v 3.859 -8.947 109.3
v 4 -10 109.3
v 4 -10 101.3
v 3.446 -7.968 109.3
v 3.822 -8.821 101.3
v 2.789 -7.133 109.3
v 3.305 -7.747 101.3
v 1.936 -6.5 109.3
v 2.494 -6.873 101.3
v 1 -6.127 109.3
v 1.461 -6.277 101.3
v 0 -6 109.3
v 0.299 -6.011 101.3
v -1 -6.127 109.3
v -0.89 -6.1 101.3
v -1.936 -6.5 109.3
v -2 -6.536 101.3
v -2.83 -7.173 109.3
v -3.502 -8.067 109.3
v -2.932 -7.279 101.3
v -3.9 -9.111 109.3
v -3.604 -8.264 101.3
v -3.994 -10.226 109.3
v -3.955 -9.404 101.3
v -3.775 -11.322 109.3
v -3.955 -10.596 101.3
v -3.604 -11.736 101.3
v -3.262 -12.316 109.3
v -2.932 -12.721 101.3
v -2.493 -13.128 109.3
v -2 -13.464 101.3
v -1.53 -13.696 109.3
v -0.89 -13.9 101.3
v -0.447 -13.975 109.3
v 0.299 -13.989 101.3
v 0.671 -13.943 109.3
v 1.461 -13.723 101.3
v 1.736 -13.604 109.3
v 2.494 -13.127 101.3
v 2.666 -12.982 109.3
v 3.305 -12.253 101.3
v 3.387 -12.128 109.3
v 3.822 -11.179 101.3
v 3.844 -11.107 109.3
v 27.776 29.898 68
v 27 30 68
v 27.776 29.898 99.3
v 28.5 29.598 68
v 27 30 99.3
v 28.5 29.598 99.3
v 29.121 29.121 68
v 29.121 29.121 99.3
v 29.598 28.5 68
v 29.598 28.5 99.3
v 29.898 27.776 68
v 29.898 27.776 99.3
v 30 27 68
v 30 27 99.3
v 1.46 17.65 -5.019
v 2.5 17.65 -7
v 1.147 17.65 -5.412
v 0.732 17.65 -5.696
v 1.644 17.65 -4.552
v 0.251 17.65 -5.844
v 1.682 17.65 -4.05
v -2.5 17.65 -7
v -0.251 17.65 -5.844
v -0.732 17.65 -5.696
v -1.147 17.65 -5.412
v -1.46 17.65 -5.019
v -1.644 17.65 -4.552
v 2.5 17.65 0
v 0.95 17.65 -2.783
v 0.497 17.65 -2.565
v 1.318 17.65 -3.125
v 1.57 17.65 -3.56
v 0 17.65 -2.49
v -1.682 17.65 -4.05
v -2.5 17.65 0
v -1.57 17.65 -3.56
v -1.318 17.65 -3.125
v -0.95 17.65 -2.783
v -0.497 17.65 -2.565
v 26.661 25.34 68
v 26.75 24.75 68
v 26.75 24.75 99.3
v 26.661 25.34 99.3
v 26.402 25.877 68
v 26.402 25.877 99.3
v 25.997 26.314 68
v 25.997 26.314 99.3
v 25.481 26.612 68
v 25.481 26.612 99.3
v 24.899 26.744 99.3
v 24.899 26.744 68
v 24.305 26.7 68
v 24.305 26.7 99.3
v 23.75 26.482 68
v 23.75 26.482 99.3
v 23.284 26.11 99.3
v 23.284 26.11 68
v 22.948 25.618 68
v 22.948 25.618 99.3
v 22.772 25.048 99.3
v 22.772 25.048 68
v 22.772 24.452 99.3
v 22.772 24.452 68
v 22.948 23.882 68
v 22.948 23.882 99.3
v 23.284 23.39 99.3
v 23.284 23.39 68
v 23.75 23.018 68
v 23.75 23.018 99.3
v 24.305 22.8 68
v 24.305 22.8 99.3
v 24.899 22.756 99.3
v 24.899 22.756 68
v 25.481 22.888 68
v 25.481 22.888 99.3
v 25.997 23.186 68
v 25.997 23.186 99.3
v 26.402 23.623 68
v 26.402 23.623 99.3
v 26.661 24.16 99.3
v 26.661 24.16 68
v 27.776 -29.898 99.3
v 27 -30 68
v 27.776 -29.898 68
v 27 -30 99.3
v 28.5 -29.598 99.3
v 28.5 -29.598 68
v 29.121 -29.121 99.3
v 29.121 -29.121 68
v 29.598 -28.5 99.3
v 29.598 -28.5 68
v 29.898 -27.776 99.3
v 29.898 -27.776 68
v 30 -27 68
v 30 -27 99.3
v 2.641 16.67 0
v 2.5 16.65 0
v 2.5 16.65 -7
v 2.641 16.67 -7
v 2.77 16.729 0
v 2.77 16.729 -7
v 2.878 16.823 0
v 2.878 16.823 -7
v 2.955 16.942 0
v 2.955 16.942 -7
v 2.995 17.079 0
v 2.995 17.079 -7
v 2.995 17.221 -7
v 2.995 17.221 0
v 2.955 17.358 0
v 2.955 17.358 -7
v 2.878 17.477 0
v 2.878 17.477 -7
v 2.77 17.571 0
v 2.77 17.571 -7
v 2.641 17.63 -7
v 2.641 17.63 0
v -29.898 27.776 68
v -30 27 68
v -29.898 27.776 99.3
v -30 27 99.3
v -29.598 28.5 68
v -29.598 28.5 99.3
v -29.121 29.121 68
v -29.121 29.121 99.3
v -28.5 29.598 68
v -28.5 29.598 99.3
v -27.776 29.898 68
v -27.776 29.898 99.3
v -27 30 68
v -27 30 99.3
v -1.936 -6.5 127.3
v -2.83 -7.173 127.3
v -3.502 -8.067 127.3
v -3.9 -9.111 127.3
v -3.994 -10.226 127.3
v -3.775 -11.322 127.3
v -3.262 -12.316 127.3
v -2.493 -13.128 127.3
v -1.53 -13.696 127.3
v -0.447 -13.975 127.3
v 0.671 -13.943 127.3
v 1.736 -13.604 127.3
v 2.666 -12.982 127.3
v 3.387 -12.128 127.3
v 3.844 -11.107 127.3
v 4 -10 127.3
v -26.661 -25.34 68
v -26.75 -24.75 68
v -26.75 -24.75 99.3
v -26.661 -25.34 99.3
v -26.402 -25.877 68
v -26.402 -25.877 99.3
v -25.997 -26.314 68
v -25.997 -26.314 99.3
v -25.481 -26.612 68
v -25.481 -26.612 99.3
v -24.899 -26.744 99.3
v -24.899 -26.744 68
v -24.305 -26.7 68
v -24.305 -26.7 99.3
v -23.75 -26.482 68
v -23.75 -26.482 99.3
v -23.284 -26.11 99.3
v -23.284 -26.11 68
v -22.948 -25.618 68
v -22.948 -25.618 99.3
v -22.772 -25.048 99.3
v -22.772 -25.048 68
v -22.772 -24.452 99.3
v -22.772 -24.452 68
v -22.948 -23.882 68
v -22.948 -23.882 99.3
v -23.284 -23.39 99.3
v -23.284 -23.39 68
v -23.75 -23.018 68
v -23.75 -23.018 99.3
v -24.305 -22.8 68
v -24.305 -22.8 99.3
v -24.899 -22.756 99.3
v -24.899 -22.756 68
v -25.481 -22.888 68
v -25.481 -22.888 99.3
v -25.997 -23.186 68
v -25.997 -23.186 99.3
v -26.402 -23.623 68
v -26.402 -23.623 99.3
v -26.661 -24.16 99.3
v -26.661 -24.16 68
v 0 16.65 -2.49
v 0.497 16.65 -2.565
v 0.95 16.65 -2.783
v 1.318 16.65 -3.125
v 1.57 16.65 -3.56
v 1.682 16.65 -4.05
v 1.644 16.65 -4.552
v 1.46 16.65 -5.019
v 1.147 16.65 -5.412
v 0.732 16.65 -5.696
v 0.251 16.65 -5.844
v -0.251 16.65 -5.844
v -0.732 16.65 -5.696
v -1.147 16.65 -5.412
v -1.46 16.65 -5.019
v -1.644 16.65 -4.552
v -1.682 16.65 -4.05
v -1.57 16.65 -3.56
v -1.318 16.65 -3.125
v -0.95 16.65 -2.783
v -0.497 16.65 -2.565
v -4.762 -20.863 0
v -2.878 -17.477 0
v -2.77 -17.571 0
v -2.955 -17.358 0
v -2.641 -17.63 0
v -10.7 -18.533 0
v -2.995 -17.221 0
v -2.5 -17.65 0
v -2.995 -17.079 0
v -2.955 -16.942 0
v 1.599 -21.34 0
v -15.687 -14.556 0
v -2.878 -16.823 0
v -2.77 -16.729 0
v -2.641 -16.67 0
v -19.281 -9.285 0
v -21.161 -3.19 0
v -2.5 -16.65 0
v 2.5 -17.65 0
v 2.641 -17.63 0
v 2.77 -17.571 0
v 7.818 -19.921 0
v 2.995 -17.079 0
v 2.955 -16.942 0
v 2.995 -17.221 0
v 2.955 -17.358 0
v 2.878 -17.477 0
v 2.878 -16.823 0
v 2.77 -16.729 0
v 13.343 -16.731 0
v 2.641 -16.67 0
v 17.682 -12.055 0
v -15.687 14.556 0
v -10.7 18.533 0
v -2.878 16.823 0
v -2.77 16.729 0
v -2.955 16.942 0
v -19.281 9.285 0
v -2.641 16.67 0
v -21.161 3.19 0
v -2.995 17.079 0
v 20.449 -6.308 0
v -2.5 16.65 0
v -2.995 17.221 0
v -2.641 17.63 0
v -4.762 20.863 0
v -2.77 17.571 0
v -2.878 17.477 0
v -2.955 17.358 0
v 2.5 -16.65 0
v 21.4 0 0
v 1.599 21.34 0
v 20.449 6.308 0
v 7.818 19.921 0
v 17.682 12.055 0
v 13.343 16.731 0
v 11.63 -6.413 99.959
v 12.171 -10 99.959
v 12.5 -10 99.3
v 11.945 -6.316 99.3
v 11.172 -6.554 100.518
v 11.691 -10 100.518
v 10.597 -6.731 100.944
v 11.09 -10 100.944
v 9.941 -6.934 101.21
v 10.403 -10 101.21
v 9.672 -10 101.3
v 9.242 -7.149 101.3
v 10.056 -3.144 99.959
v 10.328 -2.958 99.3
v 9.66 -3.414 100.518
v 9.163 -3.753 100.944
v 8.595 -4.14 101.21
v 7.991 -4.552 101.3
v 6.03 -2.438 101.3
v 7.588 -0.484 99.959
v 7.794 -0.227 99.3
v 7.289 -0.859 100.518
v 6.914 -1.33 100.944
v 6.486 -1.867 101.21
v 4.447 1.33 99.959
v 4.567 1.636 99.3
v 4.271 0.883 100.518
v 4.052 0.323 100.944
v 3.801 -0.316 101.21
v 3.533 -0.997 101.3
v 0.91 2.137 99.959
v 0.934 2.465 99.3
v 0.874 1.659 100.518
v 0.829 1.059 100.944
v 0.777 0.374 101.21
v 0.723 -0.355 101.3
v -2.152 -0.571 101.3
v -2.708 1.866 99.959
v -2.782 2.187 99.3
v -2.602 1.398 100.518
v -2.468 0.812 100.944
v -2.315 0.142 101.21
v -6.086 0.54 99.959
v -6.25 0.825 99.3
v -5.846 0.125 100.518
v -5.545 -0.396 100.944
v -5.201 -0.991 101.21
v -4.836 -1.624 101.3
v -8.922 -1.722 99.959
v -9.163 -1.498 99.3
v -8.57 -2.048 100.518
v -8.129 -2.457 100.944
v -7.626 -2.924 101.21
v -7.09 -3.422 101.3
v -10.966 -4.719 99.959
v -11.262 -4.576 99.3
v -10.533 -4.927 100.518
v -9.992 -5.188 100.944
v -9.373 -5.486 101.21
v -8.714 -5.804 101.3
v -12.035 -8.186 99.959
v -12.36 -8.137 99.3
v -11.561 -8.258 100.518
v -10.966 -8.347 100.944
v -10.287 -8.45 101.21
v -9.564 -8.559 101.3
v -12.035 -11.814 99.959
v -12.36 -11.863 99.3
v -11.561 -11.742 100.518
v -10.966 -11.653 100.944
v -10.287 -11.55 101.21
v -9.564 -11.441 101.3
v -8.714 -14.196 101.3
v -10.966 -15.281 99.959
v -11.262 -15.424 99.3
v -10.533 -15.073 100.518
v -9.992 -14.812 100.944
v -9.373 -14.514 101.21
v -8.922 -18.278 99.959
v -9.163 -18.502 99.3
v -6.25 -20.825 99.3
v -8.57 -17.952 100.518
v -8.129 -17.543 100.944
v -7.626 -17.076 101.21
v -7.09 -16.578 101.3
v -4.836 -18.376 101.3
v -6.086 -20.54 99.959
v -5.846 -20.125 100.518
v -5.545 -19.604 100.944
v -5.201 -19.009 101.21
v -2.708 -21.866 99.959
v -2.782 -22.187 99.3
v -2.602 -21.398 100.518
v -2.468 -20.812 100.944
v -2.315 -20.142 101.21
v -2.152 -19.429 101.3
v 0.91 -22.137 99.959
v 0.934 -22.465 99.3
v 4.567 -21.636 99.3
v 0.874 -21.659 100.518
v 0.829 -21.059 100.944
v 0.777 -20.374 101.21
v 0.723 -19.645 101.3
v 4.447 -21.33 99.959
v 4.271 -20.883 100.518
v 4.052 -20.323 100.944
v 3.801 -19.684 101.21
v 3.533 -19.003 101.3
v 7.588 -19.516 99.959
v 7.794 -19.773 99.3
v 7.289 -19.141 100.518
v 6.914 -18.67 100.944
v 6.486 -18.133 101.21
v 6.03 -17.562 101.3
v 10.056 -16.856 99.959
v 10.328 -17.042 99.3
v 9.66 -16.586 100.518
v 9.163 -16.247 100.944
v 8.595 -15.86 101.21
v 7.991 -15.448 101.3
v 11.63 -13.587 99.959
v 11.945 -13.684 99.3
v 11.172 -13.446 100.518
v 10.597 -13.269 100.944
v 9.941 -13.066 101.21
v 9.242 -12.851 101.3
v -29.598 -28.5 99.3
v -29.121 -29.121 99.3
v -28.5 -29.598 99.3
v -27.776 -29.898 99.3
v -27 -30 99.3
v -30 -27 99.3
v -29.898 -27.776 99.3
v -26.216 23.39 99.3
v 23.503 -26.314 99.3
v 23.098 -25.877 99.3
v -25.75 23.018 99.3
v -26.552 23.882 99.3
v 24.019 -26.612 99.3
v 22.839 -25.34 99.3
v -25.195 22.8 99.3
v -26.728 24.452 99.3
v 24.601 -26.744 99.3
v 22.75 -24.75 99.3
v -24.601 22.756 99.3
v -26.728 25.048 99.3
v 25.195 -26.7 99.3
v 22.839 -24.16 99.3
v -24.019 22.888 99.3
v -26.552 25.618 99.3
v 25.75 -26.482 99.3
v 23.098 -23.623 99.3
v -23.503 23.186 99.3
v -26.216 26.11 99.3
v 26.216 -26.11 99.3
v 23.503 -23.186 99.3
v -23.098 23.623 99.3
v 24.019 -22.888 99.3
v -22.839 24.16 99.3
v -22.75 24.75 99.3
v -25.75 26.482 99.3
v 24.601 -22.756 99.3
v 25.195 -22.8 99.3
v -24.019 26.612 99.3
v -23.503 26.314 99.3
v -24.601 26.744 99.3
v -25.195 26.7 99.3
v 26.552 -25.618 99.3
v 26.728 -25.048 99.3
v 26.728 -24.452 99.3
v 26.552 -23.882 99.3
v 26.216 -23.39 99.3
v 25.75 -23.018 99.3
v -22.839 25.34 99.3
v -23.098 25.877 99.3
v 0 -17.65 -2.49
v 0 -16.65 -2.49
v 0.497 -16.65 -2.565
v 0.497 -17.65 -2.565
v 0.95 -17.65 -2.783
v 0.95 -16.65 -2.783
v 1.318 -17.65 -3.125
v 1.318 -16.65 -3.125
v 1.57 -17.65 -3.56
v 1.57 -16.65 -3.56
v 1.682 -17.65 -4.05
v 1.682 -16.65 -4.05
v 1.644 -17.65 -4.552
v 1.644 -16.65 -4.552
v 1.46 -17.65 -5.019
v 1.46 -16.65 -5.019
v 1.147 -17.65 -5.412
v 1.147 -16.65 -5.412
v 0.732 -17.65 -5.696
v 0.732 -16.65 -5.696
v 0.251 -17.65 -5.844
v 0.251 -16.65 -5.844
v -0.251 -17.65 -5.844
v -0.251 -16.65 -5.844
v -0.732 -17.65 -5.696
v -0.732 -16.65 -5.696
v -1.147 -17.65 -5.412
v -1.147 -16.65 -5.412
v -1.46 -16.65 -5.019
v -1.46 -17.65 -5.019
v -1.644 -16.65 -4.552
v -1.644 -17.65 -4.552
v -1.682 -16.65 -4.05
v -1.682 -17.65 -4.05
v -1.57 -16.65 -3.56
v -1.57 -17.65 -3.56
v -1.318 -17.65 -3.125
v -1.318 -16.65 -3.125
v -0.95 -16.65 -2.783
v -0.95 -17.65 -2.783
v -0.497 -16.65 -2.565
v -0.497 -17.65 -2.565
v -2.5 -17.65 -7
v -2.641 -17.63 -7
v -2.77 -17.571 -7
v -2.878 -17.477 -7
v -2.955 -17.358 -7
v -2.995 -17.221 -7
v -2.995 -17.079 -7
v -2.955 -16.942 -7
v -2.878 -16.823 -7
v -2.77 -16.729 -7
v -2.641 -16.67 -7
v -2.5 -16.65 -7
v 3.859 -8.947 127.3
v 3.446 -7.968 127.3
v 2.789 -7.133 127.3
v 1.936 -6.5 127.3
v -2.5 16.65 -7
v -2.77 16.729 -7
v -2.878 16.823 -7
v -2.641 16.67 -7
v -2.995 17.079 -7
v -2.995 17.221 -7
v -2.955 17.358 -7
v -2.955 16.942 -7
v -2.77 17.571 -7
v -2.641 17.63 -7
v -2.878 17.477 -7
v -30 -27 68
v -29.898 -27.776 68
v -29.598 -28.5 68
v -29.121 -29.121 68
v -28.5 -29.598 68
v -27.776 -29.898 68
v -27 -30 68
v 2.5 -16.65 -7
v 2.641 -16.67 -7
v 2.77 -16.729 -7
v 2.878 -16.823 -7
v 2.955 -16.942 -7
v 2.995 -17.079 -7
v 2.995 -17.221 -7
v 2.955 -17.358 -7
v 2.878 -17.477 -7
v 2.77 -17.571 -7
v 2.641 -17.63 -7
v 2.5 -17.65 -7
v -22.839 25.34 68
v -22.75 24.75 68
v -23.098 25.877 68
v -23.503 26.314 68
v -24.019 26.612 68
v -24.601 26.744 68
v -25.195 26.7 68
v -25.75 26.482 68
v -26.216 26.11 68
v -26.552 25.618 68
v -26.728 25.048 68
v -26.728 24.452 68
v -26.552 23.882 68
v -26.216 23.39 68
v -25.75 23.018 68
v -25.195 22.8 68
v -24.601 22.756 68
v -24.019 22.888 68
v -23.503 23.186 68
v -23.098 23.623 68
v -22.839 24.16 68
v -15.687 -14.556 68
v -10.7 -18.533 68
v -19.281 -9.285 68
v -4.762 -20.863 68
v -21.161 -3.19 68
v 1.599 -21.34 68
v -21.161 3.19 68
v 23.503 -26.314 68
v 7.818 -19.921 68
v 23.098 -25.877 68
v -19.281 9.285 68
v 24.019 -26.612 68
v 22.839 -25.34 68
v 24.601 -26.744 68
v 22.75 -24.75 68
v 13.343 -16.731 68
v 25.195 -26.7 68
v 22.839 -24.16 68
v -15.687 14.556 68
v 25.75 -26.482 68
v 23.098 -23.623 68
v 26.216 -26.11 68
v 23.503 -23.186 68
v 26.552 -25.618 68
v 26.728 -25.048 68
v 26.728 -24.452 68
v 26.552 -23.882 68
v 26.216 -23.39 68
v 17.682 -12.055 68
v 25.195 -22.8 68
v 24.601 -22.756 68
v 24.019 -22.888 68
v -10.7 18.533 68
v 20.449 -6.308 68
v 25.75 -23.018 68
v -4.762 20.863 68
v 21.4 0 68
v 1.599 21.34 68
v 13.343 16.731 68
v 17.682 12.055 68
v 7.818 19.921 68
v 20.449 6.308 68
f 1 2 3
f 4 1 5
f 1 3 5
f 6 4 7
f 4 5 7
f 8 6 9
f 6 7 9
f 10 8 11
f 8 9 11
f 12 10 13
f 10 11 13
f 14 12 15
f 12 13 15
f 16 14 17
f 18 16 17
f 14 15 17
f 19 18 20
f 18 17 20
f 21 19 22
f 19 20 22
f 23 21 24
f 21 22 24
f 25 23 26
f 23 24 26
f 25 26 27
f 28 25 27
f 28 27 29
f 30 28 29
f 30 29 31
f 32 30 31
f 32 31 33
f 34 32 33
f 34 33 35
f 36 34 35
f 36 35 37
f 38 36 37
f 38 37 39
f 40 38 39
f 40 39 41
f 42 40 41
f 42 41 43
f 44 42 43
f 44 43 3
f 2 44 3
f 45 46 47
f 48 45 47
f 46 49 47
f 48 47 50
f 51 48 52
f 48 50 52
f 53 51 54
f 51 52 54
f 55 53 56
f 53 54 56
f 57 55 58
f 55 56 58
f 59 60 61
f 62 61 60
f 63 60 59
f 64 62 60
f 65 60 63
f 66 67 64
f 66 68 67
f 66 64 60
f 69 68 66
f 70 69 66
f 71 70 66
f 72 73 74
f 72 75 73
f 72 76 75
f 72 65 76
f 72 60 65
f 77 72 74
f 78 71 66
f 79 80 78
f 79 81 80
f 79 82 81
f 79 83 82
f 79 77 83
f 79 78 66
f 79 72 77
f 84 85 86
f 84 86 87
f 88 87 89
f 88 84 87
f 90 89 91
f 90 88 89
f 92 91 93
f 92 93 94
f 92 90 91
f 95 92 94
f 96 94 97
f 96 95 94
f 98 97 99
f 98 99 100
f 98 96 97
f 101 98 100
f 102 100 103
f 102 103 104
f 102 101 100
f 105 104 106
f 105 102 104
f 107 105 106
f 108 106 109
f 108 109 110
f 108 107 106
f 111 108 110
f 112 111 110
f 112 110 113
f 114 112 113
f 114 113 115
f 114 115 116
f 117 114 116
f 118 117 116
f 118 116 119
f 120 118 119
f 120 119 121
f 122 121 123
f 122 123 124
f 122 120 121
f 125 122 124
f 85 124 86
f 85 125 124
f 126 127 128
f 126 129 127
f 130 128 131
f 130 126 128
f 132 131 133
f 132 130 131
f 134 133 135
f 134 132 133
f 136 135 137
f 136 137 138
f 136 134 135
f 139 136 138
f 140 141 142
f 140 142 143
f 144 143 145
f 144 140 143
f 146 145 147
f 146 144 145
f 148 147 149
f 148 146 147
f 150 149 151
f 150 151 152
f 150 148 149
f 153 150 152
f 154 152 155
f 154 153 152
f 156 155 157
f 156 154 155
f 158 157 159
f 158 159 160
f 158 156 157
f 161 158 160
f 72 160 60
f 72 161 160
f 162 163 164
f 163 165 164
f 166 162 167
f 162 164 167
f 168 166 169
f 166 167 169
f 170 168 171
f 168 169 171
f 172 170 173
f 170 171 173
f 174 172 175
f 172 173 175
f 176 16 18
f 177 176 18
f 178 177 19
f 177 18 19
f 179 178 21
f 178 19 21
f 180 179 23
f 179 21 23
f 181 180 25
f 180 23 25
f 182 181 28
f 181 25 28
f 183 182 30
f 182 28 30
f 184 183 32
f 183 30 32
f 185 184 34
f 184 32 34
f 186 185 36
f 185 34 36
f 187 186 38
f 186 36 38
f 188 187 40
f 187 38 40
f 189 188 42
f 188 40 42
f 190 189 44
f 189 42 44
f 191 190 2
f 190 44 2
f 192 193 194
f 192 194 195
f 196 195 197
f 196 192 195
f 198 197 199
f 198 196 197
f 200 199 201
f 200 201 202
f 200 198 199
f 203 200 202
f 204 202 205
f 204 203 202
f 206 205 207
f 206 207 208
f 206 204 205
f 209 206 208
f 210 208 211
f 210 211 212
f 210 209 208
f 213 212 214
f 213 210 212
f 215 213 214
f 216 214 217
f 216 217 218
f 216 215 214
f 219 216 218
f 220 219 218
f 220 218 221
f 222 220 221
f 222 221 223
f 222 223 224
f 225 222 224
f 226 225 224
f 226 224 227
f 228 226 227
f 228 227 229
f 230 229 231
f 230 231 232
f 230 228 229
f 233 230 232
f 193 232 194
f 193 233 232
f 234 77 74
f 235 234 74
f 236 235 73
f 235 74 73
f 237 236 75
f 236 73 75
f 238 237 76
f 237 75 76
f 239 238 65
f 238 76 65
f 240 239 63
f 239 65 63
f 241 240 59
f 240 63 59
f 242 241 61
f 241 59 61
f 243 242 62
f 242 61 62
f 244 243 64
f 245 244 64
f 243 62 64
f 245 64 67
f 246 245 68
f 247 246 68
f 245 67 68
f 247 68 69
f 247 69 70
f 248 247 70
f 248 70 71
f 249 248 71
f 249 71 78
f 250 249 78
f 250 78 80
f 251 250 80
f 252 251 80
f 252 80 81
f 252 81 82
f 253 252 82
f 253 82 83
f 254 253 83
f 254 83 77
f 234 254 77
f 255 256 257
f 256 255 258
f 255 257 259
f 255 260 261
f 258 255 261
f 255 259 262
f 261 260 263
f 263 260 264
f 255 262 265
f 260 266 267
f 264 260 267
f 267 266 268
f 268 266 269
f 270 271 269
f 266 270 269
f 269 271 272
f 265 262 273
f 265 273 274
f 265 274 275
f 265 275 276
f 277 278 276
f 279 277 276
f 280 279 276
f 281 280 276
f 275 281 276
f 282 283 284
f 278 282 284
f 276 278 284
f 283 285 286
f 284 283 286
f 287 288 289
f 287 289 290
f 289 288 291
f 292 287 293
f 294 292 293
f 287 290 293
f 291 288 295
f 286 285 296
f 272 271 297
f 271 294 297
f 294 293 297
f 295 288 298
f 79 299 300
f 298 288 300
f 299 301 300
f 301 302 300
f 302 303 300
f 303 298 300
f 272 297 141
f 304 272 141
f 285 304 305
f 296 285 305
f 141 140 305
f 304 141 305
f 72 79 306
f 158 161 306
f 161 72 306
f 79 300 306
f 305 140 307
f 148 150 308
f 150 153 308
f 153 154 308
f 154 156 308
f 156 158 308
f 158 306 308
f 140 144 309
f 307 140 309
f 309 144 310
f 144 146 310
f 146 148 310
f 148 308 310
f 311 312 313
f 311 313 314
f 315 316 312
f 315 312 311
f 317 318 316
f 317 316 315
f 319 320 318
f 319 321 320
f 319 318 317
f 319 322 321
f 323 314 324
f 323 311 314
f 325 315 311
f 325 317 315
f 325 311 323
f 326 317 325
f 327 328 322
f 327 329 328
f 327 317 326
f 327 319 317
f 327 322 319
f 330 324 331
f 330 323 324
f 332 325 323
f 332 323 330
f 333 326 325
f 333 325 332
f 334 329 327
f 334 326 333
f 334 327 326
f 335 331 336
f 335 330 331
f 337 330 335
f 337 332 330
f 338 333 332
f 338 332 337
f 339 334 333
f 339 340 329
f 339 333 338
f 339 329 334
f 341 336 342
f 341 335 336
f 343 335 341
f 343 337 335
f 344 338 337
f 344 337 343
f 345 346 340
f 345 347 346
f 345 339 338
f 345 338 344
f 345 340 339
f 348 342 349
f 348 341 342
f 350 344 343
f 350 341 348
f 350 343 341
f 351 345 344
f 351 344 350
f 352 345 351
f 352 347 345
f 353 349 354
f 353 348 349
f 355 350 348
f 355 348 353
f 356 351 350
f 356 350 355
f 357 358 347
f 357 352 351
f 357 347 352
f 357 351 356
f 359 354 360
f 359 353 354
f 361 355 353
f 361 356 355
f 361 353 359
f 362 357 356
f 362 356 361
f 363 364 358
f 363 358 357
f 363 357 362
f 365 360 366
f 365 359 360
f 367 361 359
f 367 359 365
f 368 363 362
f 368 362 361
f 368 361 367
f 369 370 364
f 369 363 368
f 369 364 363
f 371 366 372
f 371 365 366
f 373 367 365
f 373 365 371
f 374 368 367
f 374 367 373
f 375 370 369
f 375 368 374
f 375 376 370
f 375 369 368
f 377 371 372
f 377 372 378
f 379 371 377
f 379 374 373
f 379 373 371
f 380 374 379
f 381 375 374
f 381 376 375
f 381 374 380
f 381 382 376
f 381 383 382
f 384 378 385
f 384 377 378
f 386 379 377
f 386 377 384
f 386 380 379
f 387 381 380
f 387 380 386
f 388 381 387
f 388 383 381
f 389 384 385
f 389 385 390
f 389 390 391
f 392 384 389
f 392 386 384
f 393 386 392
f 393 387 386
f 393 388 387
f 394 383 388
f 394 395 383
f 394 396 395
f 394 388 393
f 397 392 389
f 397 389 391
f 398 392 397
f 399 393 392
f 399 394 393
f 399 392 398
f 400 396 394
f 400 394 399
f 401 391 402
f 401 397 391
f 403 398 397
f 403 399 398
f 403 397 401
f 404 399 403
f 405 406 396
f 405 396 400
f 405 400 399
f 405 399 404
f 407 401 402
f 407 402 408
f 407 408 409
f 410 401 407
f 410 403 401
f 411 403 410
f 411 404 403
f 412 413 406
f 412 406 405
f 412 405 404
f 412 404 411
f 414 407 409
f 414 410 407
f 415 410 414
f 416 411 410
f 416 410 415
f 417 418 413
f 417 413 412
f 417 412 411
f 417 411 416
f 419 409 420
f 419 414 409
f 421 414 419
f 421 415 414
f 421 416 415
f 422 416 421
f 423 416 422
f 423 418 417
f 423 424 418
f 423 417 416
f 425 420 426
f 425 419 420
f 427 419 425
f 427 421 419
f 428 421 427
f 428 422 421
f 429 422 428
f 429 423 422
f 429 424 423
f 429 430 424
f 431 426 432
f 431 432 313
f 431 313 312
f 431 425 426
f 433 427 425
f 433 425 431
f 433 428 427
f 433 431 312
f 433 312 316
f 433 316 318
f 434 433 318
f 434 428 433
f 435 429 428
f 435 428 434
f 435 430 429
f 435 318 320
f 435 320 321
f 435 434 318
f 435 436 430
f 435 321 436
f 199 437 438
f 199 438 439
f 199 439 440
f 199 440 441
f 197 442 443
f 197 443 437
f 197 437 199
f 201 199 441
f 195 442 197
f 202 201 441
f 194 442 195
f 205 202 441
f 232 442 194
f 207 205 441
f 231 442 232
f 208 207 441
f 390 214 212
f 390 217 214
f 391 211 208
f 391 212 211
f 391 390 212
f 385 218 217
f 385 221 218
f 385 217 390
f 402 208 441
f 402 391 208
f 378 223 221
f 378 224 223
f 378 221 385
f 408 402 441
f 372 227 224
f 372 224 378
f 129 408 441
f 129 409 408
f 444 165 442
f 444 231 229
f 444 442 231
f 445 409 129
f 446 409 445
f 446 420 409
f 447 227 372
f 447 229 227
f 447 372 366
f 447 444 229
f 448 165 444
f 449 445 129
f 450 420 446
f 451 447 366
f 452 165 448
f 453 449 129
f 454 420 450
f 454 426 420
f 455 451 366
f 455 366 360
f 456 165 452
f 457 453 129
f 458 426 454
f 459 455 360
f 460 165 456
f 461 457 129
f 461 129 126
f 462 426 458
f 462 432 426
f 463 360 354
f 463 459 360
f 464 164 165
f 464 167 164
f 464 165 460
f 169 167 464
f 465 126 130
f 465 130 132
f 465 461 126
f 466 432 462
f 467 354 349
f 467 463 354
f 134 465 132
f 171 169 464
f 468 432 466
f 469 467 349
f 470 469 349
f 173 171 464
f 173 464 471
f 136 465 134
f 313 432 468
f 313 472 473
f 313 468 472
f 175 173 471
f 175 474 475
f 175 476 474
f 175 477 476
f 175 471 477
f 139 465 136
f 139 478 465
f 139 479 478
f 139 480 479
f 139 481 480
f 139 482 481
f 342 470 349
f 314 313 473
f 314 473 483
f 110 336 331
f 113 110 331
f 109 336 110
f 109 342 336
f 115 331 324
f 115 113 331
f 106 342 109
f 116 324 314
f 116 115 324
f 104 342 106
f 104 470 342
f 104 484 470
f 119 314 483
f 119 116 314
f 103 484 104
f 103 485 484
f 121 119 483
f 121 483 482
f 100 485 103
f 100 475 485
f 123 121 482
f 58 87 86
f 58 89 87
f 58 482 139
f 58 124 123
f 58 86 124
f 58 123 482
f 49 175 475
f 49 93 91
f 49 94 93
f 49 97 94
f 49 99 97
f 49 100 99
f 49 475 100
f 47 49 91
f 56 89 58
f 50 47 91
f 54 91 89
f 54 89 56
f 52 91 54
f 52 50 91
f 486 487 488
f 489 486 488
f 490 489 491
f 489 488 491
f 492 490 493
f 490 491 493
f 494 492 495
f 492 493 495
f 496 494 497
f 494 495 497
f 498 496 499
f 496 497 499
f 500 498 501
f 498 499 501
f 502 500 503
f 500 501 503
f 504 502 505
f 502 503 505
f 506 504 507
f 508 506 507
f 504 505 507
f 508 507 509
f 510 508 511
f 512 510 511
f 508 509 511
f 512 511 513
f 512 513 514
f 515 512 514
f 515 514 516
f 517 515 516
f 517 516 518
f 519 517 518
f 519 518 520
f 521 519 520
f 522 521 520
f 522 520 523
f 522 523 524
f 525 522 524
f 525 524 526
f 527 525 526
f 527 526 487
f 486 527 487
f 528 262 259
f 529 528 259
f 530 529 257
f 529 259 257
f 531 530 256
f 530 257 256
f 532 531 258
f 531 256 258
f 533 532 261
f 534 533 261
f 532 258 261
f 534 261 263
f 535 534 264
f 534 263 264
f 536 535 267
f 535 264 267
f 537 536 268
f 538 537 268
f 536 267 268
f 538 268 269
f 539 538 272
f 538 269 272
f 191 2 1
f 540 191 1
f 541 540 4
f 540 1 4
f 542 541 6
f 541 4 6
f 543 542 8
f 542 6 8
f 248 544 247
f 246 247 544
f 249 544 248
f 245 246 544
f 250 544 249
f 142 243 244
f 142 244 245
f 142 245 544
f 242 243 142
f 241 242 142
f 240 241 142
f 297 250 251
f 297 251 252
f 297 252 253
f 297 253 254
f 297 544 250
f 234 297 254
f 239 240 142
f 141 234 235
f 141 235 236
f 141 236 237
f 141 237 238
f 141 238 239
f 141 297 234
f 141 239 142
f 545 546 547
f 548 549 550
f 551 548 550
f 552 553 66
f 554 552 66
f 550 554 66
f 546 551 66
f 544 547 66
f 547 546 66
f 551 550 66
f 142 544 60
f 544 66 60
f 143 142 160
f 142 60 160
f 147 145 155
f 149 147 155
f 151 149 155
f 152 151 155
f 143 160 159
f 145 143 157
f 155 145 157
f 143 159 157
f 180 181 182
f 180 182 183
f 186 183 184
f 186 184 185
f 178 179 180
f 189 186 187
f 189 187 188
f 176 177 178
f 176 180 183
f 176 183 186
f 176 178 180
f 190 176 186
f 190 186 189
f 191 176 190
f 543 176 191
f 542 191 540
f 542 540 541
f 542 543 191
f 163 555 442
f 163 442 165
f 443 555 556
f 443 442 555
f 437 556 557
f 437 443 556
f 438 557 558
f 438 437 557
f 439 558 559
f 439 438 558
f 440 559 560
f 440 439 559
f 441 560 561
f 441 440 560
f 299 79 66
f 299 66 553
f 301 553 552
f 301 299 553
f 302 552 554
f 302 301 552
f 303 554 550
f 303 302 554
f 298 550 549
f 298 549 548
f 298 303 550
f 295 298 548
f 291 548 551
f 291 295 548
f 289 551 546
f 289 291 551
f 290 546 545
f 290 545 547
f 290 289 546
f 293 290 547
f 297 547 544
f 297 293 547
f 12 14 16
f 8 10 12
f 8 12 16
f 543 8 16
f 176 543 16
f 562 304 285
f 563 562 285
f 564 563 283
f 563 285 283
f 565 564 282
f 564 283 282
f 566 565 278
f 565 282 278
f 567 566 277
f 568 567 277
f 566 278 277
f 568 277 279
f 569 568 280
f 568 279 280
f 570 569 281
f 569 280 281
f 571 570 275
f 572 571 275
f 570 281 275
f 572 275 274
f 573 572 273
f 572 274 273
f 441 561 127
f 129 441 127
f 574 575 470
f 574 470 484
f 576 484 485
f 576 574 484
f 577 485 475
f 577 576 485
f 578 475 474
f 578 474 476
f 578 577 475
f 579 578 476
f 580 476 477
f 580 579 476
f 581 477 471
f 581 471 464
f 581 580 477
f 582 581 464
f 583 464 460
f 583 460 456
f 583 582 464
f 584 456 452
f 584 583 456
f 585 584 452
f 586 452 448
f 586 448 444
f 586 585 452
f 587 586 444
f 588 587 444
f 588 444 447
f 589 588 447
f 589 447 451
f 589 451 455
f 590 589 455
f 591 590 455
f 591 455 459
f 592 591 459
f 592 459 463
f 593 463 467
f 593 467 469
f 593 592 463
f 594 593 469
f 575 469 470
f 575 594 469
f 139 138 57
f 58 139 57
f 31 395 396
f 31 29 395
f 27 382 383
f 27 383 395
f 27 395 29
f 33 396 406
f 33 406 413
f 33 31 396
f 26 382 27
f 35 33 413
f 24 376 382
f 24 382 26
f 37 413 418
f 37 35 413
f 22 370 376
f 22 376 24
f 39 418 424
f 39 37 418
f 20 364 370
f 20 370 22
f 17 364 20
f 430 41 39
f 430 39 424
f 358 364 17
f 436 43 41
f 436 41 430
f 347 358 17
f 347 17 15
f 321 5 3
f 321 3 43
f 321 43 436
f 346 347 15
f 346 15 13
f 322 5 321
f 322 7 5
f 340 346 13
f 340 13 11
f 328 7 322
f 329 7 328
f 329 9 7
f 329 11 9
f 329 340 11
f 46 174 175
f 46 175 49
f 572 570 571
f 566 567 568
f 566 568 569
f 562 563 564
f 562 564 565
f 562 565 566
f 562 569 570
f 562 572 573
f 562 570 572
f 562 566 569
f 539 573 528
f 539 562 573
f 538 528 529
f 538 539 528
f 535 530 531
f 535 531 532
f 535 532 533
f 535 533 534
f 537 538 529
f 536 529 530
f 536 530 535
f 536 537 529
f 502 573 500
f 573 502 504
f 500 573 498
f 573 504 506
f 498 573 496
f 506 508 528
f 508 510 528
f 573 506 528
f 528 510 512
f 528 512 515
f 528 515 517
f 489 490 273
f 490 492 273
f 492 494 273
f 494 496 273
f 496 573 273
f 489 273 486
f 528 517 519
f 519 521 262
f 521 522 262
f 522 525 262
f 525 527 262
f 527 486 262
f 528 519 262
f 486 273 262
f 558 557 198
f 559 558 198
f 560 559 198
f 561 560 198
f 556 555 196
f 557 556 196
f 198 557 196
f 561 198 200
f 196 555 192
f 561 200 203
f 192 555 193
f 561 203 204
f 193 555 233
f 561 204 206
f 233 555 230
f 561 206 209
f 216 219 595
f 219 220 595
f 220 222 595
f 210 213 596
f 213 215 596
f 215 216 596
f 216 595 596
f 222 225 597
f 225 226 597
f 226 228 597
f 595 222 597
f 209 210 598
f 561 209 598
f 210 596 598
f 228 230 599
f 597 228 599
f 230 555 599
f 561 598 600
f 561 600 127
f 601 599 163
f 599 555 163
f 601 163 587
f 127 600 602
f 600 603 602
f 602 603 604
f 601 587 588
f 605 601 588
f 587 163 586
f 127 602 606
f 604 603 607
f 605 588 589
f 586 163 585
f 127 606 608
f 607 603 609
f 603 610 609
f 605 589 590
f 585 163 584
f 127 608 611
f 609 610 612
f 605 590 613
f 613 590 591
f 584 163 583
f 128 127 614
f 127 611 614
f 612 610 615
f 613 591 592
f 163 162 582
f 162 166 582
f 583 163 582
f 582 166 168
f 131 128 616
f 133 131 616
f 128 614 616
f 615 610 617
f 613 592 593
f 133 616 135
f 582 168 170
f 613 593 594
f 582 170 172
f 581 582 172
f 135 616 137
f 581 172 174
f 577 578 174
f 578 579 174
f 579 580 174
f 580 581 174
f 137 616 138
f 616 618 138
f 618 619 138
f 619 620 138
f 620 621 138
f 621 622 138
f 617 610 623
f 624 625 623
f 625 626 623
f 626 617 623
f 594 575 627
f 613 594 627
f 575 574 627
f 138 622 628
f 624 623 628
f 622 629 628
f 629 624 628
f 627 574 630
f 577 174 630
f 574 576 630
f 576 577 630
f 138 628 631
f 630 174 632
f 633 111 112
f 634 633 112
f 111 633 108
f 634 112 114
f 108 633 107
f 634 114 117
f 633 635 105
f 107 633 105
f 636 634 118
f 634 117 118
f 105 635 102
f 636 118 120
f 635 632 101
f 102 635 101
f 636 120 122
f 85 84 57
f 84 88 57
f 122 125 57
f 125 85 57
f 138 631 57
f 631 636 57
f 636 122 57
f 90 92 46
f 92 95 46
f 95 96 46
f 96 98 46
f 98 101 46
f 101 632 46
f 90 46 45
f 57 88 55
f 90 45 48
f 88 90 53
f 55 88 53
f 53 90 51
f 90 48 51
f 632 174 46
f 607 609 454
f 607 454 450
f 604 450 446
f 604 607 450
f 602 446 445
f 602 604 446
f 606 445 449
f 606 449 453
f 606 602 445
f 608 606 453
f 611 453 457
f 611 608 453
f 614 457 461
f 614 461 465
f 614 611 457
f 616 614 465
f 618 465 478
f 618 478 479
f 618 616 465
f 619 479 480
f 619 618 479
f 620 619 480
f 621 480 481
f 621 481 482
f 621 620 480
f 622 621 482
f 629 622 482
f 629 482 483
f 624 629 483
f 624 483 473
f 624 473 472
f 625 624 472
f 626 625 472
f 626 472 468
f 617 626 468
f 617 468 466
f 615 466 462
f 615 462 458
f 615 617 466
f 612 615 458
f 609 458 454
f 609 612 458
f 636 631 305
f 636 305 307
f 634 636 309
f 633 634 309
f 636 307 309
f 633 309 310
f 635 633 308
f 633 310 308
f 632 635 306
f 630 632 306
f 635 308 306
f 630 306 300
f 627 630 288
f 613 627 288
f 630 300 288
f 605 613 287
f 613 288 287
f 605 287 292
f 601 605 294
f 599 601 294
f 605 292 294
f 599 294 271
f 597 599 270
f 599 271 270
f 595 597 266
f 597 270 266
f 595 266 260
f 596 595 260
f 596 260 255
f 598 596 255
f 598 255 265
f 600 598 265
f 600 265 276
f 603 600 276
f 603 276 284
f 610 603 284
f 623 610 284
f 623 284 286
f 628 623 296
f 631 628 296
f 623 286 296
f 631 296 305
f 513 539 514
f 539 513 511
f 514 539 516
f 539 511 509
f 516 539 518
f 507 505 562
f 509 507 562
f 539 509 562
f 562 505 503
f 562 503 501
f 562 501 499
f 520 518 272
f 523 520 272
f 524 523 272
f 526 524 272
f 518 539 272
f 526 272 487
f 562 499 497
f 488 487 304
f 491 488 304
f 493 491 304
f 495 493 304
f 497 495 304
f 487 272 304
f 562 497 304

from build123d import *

# Parameters (mm, degrees)
SKETCH1_R           = 21.4
BOSS_EXTRUDE1_DEPTH = 68
SKETCH2_W           = 60
SKETCH2_H           = 60
SKETCH2_R           = 2
BOSS_EXTRUDE2_DEPTH = 31.3
SKETCH3_R           = 12.5
BOSS_EXTRUDE3_DEPTH = 2
FILLET1_R           = 3
SKETCH4_R           = 4
BOSS_EXTRUDE4_DEPTH = 8
BOSS_EXTRUDE5_DEPTH = 18
FILLET2_R           = 3
BOSS_EXTRUDE6_DEPTH = 7
CUT_EXTRUDE1_REACH  = 141.197
SKETCH7_R           = 1.686317599


with BuildPart() as part:
    # Sketch1 → Boss-Extrude1 (new body)
    with BuildSketch(Plane.XY):
        Circle(SKETCH1_R)
    extrude(amount=BOSS_EXTRUDE1_DEPTH)

    # Sketch2 → Boss-Extrude2 (add)
    with BuildSketch(Plane.XY.offset(68)):
        Rectangle(SKETCH2_W, SKETCH2_H)
        with Locations((-24.75, 24.75)):
            Circle(SKETCH2_R, mode=Mode.SUBTRACT)
        with Locations((24.75, 24.75)):
            Circle(SKETCH2_R, mode=Mode.SUBTRACT)
        with Locations(Location((24.75, -24.75, 0), (0, 0, 180))):
            Circle(SKETCH2_R, mode=Mode.SUBTRACT)
        with Locations(Location((-24.75, -24.75, 0), (0, 0, 180))):
            Circle(SKETCH2_R, mode=Mode.SUBTRACT)
    extrude(amount=BOSS_EXTRUDE2_DEPTH)

    # Sketch3 → Boss-Extrude3 (add)
    with BuildSketch(Plane.XY.offset(99.3)):
        with Locations((0, -10)):
            Circle(SKETCH3_R)
    extrude(amount=BOSS_EXTRUDE3_DEPTH)

    # Fillet1
    # the kernel refuses this fillet: 3 mm, written as the material it takes off along each edge
    with BuildSketch(Plane(origin=(0, -10, 101.3), x_dir=(1, 0, 0), z_dir=(0, -1, 0))) as fillet1_piece_1:
        with BuildLine():
            CenterArc((9.671572875, -3), FILLET1_R, 19.471220634, 70.528779366)
            Line((9.671572875, 0), (9.671572875, 0.06))
            Line((9.671572875, 0.06), (12.5, 0.06))
            Line((12.5, 0.06), (12.56, 0))
            ThreePointArc((12.56, 0), (12.56, -1), (12.556568542, -1.98))
            Line((12.556568542, -1.98), (12.5, -2))
        make_face()
    revolve(axis=Axis((0, -10, 101.3), (0, 0, 1)), mode=Mode.SUBTRACT)

    # Sketch4 → Boss-Extrude4 (add)
    with BuildSketch(Plane.XY.offset(101.3)):
        with Locations((0, -10)):
            Circle(SKETCH4_R)
    extrude(amount=BOSS_EXTRUDE4_DEPTH)

    # Sketch5 → Boss-Extrude5 (add)
    with BuildSketch(Plane.XY.offset(109.3)):
        with BuildLine():
            Line((1.936491673, -6.5), (-1.936491673, -6.5))
            ThreePointArc((-1.936491673, -6.5), (-2.031506006, -13.445719569), (4, -10))
            ThreePointArc((4, -10), (3.445719569, -7.968493994), (1.936491673, -6.5))
        make_face()
    extrude(amount=BOSS_EXTRUDE5_DEPTH)

    # Fillet2
    fillet2_edges = [part.edges().sort_by_distance(p)[0] for p in [
        (-30, -30, 83.65),
        (30, -30, 83.65),
        (30, 30, 83.65),
        (-30, 30, 83.65),
    ]]
    fillet(fillet2_edges, radius=FILLET2_R)

    # Sketch6 → Boss-Extrude6 (add)
    with BuildSketch(Plane(origin=(0, 0, 0), x_dir=(-1, 0, 0), z_dir=(0, 0, -1))):
        with BuildLine():
            Line((-2.5, 17.65), (2.5, 17.65))
            ThreePointArc((2.5, 17.65), (3, 17.15), (2.5, 16.65))
            Line((2.5, 16.65), (-2.5, 16.65))
            ThreePointArc((-2.5, 16.65), (-3, 17.15), (-2.5, 17.65))
        make_face()
        with BuildLine():
            Line((-2.5, -17.65), (2.5, -17.65))
            ThreePointArc((2.5, -17.65), (3, -17.15), (2.5, -16.65))
            Line((2.5, -16.65), (-2.5, -16.65))
            ThreePointArc((-2.5, -16.65), (-3, -17.15), (-2.5, -17.65))
        make_face()
    extrude(amount=BOSS_EXTRUDE6_DEPTH)

    # Cut-Extrude1: up to this face of the body (flat: up to its plane)
    cut_extrude1_end = Plane(part.part.faces().sort_by_distance((0, -17.65, -3.5))[0])
    # Sketch7 → Cut-Extrude1 (cut, up to the picked face)
    with BuildSketch(Plane(origin=(0, 17.65, 0), x_dir=(1, 0, 0), z_dir=(0, 1, 0)), mode=Mode.PRIVATE) as cut_extrude1_sk1:
        with Locations(Location((0, 4.176322203, 0), (0, 0, 270))):
            Circle(SKETCH7_R)
    cut_extrude1_tool1 = split(extrude(cut_extrude1_sk1.sketch, amount=-CUT_EXTRUDE1_REACH, mode=Mode.PRIVATE), bisect_by=cut_extrude1_end, keep=Keep.BOTH, mode=Mode.PRIVATE)
    add(cut_extrude1_tool1.solids().sort_by(Axis((0, 17.65, -4.176322), (0, -1, 0)))[0], mode=Mode.SUBTRACT)


solid = part.part
